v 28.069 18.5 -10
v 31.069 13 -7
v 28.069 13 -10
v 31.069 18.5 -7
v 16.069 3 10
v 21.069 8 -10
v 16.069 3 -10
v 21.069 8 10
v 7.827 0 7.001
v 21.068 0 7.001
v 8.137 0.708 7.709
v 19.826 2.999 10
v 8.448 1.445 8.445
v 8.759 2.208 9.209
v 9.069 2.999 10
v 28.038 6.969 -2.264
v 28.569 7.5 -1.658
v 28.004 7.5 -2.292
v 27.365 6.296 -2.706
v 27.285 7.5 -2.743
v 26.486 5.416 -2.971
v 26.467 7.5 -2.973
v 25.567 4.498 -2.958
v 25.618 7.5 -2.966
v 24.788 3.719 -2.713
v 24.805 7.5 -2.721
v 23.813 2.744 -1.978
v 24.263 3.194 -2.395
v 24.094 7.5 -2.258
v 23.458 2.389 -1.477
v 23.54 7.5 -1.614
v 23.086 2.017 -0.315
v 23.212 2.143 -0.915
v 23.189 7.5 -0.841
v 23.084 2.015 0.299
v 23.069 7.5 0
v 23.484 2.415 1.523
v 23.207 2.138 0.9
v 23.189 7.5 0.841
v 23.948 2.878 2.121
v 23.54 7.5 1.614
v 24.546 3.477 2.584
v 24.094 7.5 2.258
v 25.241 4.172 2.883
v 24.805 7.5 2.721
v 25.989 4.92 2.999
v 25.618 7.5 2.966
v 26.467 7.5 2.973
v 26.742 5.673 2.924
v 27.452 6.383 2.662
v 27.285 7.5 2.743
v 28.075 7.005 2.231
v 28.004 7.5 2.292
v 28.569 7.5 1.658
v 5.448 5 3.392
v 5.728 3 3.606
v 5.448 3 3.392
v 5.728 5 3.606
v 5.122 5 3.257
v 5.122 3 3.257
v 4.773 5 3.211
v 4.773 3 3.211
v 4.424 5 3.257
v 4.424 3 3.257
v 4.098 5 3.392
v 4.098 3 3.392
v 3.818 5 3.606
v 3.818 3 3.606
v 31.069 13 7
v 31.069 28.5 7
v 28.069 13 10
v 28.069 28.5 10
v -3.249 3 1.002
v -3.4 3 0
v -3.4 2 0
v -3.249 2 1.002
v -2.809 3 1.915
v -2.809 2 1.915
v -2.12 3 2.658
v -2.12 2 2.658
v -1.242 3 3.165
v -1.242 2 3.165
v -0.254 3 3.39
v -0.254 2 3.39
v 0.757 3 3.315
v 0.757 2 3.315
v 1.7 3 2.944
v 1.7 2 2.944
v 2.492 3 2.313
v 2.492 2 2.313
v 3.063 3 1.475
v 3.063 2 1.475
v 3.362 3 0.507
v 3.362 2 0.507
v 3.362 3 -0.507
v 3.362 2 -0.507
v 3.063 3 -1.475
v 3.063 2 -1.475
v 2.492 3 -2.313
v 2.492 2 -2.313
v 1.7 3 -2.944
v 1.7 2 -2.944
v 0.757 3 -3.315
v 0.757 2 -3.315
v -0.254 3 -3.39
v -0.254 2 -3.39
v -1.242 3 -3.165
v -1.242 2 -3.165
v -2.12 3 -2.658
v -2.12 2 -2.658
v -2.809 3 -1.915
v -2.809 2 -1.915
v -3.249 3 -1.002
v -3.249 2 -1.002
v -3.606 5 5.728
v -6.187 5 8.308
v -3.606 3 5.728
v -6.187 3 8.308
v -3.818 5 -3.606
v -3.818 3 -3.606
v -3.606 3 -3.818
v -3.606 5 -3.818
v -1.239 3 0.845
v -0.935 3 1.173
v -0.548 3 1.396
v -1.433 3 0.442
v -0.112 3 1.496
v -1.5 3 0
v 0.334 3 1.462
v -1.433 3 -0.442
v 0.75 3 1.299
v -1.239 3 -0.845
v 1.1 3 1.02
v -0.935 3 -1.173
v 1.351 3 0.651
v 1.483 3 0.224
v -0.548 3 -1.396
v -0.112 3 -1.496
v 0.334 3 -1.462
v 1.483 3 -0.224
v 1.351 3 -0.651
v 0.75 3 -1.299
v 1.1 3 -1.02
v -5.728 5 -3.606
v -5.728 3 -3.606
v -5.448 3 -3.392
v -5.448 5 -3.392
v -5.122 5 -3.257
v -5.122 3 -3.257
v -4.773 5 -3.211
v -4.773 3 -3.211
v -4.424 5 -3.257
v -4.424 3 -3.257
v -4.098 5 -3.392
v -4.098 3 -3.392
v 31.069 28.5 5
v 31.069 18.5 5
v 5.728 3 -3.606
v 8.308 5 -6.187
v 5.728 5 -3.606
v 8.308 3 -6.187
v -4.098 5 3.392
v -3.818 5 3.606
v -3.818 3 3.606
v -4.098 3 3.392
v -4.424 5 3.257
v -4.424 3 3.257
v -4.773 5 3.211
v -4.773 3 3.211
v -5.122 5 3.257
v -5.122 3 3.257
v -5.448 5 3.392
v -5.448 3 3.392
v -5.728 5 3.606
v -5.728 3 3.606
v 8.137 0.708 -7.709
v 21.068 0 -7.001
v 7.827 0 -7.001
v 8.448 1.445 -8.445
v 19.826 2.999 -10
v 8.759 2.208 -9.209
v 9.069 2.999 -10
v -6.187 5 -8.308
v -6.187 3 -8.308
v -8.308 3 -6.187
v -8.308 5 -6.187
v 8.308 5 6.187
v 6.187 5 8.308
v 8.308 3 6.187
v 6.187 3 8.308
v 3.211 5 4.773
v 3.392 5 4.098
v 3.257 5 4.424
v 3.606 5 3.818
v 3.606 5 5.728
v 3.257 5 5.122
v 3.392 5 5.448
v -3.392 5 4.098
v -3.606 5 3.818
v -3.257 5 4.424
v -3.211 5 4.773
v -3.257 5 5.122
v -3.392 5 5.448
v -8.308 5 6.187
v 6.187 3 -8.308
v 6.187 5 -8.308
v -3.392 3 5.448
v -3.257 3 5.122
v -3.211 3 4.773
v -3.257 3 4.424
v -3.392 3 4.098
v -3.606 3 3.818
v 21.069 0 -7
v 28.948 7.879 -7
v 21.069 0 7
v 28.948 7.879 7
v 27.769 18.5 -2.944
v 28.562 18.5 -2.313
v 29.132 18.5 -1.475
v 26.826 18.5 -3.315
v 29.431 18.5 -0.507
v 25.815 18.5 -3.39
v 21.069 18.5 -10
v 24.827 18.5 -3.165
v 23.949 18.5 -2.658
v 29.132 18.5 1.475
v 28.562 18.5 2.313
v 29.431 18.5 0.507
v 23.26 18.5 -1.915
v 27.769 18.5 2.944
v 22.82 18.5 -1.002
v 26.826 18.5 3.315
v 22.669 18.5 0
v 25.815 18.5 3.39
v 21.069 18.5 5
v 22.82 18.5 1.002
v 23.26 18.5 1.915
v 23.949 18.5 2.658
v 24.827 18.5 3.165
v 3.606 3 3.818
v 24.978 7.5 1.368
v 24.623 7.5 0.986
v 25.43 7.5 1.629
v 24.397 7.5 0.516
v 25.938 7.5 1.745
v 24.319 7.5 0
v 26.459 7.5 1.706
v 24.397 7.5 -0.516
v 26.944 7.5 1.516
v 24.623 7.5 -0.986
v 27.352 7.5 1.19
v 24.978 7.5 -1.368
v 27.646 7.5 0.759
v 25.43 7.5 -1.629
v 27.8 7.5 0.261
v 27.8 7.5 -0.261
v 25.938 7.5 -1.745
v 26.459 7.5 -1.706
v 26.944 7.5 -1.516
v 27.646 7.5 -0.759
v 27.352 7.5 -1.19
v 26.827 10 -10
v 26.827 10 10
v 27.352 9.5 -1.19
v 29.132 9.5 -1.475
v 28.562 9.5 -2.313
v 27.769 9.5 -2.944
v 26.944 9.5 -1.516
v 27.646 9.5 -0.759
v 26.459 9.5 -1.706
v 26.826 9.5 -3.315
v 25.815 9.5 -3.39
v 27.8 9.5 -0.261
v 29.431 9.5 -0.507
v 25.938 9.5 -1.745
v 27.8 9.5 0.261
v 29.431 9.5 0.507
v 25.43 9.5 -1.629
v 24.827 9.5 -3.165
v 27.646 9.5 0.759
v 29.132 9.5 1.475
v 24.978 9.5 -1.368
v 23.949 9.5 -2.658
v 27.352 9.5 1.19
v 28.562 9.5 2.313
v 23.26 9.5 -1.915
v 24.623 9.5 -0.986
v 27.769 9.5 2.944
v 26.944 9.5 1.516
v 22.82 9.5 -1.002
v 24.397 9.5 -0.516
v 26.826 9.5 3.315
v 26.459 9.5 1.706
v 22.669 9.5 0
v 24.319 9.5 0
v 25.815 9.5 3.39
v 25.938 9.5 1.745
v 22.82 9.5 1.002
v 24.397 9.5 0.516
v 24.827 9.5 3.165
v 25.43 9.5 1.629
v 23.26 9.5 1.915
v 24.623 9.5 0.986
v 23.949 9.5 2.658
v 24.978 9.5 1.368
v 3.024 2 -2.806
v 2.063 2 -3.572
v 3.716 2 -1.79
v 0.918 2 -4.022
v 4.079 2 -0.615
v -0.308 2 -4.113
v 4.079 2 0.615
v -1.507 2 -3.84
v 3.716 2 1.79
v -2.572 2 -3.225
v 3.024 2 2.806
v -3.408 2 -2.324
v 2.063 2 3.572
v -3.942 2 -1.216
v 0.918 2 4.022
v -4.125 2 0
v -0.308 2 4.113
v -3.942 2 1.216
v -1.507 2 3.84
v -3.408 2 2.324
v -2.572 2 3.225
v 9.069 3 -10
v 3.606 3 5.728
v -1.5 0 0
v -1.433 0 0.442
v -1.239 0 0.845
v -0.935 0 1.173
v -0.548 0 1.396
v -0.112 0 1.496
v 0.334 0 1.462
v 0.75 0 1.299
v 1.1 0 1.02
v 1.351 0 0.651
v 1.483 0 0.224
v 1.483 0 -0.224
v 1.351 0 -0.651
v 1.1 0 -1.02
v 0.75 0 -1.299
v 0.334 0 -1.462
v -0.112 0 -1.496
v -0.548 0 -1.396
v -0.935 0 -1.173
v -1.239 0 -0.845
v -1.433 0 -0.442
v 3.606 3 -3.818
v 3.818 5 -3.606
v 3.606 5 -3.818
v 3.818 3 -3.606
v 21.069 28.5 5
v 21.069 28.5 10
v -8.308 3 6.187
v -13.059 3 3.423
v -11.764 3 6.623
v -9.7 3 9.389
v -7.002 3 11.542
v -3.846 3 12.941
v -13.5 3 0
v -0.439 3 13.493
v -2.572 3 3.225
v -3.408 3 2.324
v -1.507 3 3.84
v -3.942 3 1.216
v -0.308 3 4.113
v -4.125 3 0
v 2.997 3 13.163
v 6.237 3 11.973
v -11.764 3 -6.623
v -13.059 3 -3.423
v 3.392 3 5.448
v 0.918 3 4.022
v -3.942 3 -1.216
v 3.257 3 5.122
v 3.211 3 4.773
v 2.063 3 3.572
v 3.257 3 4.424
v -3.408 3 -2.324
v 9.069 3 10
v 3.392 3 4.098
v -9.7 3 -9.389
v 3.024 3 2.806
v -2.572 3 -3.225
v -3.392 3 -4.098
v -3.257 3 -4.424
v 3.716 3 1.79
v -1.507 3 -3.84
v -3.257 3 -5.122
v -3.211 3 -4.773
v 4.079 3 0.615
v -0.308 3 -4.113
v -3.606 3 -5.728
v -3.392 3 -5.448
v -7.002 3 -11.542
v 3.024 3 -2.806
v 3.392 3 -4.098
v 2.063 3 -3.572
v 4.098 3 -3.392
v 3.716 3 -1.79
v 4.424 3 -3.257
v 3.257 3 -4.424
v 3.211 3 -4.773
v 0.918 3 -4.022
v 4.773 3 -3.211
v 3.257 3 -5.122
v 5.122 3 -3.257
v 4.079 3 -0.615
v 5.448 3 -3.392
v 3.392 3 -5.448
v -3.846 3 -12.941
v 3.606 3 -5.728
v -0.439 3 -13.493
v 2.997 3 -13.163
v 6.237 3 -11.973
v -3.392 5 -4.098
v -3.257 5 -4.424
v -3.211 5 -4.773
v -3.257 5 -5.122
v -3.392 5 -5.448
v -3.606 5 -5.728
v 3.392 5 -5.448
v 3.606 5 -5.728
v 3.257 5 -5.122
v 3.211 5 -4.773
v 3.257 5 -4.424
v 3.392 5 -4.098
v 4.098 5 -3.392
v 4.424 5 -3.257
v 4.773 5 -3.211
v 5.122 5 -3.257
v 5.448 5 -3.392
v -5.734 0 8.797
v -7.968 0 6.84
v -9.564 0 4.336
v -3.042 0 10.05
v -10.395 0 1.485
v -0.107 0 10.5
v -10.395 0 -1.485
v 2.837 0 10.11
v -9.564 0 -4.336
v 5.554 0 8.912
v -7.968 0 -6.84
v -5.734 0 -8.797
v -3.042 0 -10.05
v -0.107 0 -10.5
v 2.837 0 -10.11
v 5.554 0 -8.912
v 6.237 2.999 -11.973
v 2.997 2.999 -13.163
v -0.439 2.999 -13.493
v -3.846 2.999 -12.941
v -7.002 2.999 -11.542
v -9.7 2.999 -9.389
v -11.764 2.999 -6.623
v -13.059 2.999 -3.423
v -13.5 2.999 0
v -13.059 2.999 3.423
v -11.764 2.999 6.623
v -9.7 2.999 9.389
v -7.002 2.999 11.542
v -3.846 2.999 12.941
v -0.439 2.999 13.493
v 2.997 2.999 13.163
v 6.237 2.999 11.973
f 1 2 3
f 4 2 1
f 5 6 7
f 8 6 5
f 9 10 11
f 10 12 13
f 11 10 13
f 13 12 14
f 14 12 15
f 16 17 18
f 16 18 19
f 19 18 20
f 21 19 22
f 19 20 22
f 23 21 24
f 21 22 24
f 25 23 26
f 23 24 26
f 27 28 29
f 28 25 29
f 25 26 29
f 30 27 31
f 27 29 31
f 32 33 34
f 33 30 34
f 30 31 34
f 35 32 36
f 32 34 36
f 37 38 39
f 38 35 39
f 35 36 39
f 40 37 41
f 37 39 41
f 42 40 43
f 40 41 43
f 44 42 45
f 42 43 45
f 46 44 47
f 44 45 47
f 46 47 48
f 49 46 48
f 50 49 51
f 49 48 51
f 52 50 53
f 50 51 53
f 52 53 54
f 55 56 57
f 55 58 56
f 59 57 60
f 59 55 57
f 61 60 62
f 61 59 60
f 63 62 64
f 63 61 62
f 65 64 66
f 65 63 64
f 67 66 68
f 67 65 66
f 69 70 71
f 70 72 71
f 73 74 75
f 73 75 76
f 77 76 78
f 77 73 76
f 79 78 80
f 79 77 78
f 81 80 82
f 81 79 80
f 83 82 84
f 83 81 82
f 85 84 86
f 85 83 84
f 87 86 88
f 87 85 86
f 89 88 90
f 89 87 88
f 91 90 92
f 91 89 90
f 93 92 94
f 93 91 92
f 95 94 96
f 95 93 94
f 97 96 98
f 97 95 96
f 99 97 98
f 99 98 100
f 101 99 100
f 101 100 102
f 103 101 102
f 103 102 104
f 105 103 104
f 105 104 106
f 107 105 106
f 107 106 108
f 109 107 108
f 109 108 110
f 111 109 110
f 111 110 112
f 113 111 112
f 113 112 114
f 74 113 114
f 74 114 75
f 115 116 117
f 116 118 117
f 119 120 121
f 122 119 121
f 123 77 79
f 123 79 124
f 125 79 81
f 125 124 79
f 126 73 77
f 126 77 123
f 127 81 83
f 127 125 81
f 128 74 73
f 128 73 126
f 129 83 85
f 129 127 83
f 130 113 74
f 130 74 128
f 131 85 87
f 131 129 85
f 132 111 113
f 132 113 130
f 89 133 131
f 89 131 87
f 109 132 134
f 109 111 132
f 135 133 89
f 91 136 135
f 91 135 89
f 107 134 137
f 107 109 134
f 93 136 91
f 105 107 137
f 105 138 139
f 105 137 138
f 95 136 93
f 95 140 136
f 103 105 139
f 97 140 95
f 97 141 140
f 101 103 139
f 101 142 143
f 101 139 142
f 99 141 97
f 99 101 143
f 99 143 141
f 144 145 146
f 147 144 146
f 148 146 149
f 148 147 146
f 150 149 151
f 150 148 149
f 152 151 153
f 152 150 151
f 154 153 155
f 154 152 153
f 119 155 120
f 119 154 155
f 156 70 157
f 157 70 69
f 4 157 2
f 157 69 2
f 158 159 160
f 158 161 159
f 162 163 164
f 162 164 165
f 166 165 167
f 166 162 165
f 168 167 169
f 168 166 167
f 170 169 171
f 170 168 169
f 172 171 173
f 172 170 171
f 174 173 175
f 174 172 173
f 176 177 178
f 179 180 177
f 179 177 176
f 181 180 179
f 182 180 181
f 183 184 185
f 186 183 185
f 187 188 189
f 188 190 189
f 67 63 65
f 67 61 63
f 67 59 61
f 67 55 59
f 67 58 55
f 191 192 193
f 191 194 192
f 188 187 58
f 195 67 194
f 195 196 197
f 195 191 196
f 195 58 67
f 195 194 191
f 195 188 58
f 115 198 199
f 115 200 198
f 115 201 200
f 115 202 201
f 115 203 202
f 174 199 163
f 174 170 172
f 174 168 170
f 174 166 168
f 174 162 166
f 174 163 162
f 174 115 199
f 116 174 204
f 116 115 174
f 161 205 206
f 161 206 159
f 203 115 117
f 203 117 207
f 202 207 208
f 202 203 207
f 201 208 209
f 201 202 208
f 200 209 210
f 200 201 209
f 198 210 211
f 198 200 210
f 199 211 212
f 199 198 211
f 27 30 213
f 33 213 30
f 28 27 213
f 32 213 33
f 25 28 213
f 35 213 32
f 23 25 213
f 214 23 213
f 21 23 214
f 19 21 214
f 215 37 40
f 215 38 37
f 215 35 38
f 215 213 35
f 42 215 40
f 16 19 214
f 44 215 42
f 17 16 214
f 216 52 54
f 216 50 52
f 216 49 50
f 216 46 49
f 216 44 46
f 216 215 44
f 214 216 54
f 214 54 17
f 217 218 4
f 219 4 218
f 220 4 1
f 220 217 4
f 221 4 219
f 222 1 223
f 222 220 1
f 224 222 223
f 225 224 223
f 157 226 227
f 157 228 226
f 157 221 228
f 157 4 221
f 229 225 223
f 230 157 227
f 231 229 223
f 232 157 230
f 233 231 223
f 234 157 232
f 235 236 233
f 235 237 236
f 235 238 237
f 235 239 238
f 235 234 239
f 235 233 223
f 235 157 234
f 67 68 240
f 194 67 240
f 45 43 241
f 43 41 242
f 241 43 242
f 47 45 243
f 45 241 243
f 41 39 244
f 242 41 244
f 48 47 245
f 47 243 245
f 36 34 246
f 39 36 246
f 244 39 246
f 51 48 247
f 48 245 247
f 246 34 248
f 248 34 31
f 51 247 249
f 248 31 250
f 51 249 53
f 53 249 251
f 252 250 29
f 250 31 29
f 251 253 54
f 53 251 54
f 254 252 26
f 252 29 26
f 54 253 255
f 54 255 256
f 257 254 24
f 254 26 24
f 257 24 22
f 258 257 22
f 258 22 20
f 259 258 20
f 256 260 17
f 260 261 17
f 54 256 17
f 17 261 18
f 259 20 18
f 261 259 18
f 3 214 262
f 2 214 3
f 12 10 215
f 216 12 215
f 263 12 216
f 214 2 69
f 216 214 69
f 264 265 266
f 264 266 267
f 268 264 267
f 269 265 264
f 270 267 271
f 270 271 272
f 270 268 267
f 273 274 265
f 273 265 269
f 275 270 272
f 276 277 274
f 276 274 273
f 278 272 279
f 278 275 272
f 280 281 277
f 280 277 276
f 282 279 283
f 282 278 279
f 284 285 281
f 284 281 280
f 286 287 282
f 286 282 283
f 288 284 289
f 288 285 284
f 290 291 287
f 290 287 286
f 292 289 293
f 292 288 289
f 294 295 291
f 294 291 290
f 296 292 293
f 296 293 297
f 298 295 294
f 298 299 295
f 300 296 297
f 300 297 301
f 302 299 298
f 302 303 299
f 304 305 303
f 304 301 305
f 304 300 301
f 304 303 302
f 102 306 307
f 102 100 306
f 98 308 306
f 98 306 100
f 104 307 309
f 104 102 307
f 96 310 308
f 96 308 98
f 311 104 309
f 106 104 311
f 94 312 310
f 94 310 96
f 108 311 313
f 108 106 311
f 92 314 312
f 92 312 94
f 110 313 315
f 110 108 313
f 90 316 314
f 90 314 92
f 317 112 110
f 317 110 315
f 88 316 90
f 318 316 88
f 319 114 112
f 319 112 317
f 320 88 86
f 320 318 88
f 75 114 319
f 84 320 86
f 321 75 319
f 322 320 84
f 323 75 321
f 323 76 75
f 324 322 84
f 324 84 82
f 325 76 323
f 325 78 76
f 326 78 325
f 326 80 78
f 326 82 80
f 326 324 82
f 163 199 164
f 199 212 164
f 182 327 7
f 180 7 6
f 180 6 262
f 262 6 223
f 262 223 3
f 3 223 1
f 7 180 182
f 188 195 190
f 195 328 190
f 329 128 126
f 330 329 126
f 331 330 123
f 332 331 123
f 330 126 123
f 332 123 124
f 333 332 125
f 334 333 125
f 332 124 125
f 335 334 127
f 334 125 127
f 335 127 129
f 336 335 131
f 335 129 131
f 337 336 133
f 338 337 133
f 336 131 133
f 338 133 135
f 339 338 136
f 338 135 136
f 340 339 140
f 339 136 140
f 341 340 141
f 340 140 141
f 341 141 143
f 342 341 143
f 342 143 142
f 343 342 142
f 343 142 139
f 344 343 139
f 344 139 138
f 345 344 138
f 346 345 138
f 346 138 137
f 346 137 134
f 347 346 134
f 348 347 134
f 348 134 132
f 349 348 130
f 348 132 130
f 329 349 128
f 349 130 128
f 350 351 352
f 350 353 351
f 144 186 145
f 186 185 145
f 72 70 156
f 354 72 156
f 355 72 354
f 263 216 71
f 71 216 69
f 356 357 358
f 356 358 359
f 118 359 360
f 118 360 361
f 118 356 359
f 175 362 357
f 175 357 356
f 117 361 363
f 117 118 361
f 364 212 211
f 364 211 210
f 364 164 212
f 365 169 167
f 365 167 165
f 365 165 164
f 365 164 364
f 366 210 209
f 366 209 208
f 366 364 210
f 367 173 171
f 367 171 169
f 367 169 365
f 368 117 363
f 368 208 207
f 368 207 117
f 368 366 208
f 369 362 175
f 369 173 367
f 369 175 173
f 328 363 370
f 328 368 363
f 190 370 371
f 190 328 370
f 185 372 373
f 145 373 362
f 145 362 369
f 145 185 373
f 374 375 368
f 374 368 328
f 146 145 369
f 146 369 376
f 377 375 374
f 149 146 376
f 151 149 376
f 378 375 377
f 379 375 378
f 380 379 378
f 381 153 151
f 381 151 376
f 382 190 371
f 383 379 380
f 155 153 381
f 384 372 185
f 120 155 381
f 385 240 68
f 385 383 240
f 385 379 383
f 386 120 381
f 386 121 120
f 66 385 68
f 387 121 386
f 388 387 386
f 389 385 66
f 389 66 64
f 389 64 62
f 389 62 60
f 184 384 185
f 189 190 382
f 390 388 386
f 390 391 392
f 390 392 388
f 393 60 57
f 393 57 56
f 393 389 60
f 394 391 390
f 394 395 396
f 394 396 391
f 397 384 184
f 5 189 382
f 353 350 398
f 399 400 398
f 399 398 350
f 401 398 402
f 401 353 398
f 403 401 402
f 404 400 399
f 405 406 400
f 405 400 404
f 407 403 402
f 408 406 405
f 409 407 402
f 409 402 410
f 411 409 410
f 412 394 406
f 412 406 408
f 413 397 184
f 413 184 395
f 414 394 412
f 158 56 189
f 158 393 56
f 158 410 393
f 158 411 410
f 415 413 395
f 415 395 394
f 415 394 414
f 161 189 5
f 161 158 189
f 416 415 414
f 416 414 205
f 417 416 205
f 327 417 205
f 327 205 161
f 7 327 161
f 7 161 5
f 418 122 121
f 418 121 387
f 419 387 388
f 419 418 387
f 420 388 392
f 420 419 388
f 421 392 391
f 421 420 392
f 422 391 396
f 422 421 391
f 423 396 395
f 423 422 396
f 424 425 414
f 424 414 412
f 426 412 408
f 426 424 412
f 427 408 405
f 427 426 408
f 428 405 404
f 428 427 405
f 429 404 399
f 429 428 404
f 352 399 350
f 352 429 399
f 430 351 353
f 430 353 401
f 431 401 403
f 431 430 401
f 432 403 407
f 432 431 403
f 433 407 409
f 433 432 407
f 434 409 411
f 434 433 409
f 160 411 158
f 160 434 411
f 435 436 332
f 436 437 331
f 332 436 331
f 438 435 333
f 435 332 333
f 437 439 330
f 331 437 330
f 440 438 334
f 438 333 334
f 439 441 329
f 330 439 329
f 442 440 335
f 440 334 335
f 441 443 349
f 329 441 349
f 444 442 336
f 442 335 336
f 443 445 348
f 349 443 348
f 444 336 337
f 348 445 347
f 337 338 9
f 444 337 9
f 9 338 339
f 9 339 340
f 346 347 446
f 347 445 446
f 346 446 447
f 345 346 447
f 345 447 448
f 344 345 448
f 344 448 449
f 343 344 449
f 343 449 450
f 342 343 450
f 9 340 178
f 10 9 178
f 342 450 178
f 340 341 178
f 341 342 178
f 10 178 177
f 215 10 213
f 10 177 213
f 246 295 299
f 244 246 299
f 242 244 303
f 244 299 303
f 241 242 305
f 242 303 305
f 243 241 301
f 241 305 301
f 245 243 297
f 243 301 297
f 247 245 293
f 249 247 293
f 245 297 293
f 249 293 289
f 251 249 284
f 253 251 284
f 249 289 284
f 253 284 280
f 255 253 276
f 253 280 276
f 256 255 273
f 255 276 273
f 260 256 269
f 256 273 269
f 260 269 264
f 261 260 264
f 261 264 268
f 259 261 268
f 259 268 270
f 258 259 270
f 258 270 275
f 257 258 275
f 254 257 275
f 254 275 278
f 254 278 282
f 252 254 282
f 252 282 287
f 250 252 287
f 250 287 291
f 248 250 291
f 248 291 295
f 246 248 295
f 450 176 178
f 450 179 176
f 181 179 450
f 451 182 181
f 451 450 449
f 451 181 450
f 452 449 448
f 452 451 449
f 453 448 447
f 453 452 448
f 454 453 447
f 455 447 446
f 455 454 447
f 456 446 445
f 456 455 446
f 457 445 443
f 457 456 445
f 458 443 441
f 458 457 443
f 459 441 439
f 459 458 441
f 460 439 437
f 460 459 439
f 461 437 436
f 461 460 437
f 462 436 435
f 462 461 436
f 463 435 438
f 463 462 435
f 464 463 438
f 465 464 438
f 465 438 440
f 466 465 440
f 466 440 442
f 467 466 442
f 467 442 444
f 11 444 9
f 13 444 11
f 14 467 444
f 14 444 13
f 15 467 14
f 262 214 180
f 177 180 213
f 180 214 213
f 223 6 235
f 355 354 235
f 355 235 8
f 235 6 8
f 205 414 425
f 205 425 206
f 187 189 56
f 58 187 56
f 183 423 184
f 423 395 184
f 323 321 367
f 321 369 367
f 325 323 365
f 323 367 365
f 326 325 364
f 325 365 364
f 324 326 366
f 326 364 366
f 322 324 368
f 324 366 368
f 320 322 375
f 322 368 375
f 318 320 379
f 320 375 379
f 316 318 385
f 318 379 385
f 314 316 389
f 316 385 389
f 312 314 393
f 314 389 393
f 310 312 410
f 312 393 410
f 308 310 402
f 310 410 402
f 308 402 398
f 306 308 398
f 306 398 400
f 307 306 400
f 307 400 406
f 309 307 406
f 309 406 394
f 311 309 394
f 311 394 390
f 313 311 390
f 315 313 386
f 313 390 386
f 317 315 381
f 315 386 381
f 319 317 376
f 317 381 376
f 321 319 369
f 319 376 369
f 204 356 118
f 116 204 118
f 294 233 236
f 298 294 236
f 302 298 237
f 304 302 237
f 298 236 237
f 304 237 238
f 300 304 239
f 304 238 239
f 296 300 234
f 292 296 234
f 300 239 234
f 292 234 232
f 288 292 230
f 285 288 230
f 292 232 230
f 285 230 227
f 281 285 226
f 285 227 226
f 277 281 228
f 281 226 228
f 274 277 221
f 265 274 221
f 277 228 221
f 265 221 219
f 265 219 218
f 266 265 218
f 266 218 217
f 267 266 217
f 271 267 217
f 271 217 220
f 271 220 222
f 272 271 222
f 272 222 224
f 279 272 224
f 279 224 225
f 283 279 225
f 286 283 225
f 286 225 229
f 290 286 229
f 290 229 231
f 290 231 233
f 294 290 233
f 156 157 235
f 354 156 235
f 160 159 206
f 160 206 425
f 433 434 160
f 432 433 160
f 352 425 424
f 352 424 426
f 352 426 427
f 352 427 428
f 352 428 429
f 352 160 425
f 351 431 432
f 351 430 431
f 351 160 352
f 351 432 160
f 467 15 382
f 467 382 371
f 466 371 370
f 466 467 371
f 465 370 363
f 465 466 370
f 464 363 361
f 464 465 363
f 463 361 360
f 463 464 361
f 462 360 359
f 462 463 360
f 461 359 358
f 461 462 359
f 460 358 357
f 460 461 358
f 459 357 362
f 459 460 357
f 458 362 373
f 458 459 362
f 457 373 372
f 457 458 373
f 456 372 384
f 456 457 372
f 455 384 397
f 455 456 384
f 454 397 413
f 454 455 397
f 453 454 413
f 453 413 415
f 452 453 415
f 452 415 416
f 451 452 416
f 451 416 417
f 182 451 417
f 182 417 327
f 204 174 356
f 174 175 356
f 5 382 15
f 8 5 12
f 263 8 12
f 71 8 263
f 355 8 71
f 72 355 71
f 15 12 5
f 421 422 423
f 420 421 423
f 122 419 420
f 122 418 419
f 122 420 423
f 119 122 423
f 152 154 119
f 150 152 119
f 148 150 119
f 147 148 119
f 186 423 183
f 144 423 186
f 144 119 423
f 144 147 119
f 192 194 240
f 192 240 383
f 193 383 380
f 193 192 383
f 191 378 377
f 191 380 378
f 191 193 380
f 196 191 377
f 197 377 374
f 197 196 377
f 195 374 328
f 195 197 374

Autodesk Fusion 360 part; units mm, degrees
sketch "Sketch1" plane through (0, 0, 0) normal (0, 1, 0) x (1, 0, 0)
  circle A0 centre (0, 0) radius 13.5
  line L0 (9.0692, -10) -> (9.0692, 10)
  line L1 (9.0692, 10) -> (21.0692, 10)
  line L2 (21.0692, 10) -> (21.0692, -10)
  line L3 (21.0692, -10) -> (9.0692, -10)
  line L4 (9.0692, -10) -> (9.0692, 10)
  dimension "d1" = 27
  dimension "d4" = 20
  dimension "d5" = 12
  dimension "d6" = 20
extrude "Extrude1" add sketch "Sketch1" along normal blind 3
sketch "Sketch2" plane through (0, 3, 0) normal (0, 1, 0) x (-1, 0, 0)
  arc A0 (-9.0692, -10) -> (-9.0692, 10) centre (0, 0) ccw
  line L0 (-9.0692, 10) -> (-21.0692, 10)
  line L1 (-21.0692, 10) -> (-21.0692, -10)
  line L2 (-21.0692, -10) -> (-9.0692, -10)
  circle A1 centre (0, 0) radius 1.5
  dimension "d11" = 3
extrude "Extrude2" cut sketch "Sketch2" against normal blind 7 contours A1
sketch "Sketch3" plane through (0, 3, 0) normal (0, 1, 0) x (-1, 0, 0)
  circle A0 centre (0, 0) radius 1.5
  arc A1 (-9.0692, -10) -> (-9.0692, 10) centre (0, 0) ccw
  line L0 (-9.0692, 10) -> (-21.0692, 10)
  line L1 (-21.0692, 10) -> (-21.0692, -10)
  line L2 (-21.0692, -10) -> (-9.0692, -10)
  line L3 (0, 0) -> (7.2478, -7.2478) construction
  line L4 (0, 0) -> (-7.2478, 7.2478) construction
  line L5 (0, 0) -> (7.2478, 7.2478) construction
  line L6 (0, 0) -> (10.5, 0) construction
  line L7 (0, 0) -> (-7.2478, -7.2478) construction
  line L8 (-7.2478, 7.2478) -> (-6.1872, 8.3085) construction
  line L9 (7.2478, 7.2478) -> (8.3085, 6.1872) construction
  line L10 (7.2478, -7.2478) -> (6.1872, -8.3085) construction
  line L11 (-7.2478, -7.2478) -> (-8.3085, -6.1872) construction
  line L12 (-8.3085, -6.1872) -> (-4.773, -2.6517)
  line L13 (-4.773, -2.6517) -> (-2.6517, -4.773)
  line L14 (-4.773, -2.6517) -> (-1.773, -2.6517) construction
  line L15 (-2.6517, -4.773) -> (-6.1872, -8.3085)
  line L16 (-6.1872, -8.3085) -> (-8.3085, -6.1872)
  line L17 (-6.1872, 8.3085) -> (-8.3085, 6.1872)
  line L18 (-8.3085, 6.1872) -> (-4.773, 2.6517)
  line L19 (-4.773, 2.6517) -> (-2.6517, 4.773)
  line L20 (-4.773, 2.6517) -> (-1.773, 2.6517) construction
  line L21 (-2.6517, 4.773) -> (-6.1872, 8.3085)
  line L22 (8.3085, 6.1872) -> (6.1872, 8.3085)
  line L23 (6.1872, 8.3085) -> (2.6517, 4.773)
  line L24 (6.1872, 8.3085) -> (11.1872, 8.3085) construction
  line L25 (2.6517, 4.773) -> (4.773, 2.6517)
  line L26 (4.773, 2.6517) -> (8.3085, 6.1872)
  line L27 (6.1872, -8.3085) -> (8.3085, -6.1872)
  line L28 (8.3085, -6.1872) -> (4.773, -2.6517)
  line L29 (4.773, -2.6517) -> (2.6517, -4.773)
  line L30 (2.6517, -4.773) -> (6.1872, -8.3085)
  dimension "d15" = 10.25
  dimension "d16" = 10.25
  dimension "d18" = 45
  dimension "d19" = 10.25
  dimension "d20" = 10.25
  dimension "d79" = 1.5
  dimension "d80" = 1.5
  dimension "d81" = 1.5
  dimension "d84" = 1.5
  dimension "d85" = 5
  dimension "d86" = 45
  dimension "d87" = 3
  dimension "d88" = 5
  dimension "d89" = 3
  dimension "d90" = 5
  dimension "d91" = 45
  dimension "d92" = 3
  dimension "d93" = 3
  dimension "d94" = 135
  dimension "d95" = 5
  dimension "d96" = 3
  dimension "d97" = 3
  dimension "d98" = 5
  dimension "d99" = 3
extrude "Extrude12" add sketch "Sketch3" along normal blind 2 contours L12 L13 L15 L16 | L17 L18 L19 L21 | L22 L23 L25 L26 | L27 L28 L29 L30
sketch "Sketch4" plane through (0, 3, 0) normal (0, 1, 0) x (-1, 0, 0)
  circle A0 centre (0, 0) radius 1.5
  arc A1 (-9.0692, -10) -> (-9.0692, 10) centre (0, 0) ccw
  line L0 (-9.0692, 10) -> (-21.0692, 10)
  line L1 (-21.0692, 10) -> (-21.0692, -10)
  line L2 (-21.0692, -10) -> (-9.0692, -10)
  circle A2 centre (0, 0) radius 3.4
  circle A3 centre (0, 0) radius 4.125
  line L3 (-2.6517, 4.773) -> (-4.773, 2.6517)
  line L4 (-4.773, 2.6517) -> (-8.3085, 6.1872)
  line L5 (-8.3085, 6.1872) -> (-6.1872, 8.3085)
  line L6 (-6.1872, 8.3085) -> (-2.6517, 4.773)
  line L7 (4.773, 2.6517) -> (2.6517, 4.773)
  line L8 (2.6517, 4.773) -> (6.1872, 8.3085)
  line L9 (6.1872, 8.3085) -> (8.3085, 6.1872)
  line L10 (8.3085, 6.1872) -> (4.773, 2.6517)
  line L11 (-6.1872, -8.3085) -> (-8.3085, -6.1872)
  line L12 (-8.3085, -6.1872) -> (-4.773, -2.6517)
  line L13 (-4.773, -2.6517) -> (-2.6517, -4.773)
  line L14 (-2.6517, -4.773) -> (-6.1872, -8.3085)
  line L15 (2.6517, -4.773) -> (4.773, -2.6517)
  line L16 (4.773, -2.6517) -> (8.3085, -6.1872)
  line L17 (8.3085, -6.1872) -> (6.1872, -8.3085)
  line L18 (6.1872, -8.3085) -> (2.6517, -4.773)
  dimension "d42" = 6.8
  dimension "d43" = 8.25
extrude "Extrude4" cut sketch "Sketch4" against normal blind 1 contours A3
sketch "Sketch5" plane through (0, 3, 0) normal (0, 1, 0) x (-1, 0, 0)
  arc A0 (-9.0692, -10) -> (-9.0692, 10) centre (0, 0) ccw
  line L0 (-9.0692, 10) -> (-21.0692, 10)
  line L1 (-21.0692, 10) -> (-21.0692, -10)
  line L2 (-21.0692, -10) -> (-9.0692, -10)
  circle A1 centre (0, 0) radius 4.125
  line L3 (-21.0692, -10) -> (-31.0692, -10)
  line L4 (-31.0692, -10) -> (-31.0692, 10)
  line L5 (-31.0692, 10) -> (-21.0692, 10)
  line L6 (-21.0692, 10) -> (-21.0692, -10)
  line L7 (2.6517, -4.773) -> (4.773, -2.6517)
  line L8 (4.773, -2.6517) -> (8.3085, -6.1872)
  line L9 (8.3085, -6.1872) -> (6.1872, -8.3085)
  line L10 (6.1872, -8.3085) -> (2.6517, -4.773)
  line L11 (-6.1872, -8.3085) -> (-8.3085, -6.1872)
  line L12 (-8.3085, -6.1872) -> (-4.773, -2.6517)
  line L13 (-4.773, -2.6517) -> (-2.6517, -4.773)
  line L14 (-2.6517, -4.773) -> (-6.1872, -8.3085)
  line L15 (4.773, 2.6517) -> (2.6517, 4.773)
  line L16 (2.6517, 4.773) -> (6.1872, 8.3085)
  line L17 (6.1872, 8.3085) -> (8.3085, 6.1872)
  line L18 (8.3085, 6.1872) -> (4.773, 2.6517)
  line L19 (-2.6517, 4.773) -> (-4.773, 2.6517)
  line L20 (-4.773, 2.6517) -> (-8.3085, 6.1872)
  line L21 (-8.3085, 6.1872) -> (-6.1872, 8.3085)
  line L22 (-6.1872, 8.3085) -> (-2.6517, 4.773)
  dimension "d46" = 10
  dimension "d47" = 20
extrude "Extrude5" add sketch "Sketch5" along normal blind 16.5 contours L1 L3 L4 L5 L6
sketch "Sketch6" plane through (0, 19.5, 0) normal (0, 1, 0) x (-1, 0, 0)
  line L0 (-21.0692, 10) -> (-31.0692, 10)
  line L1 (-31.0692, 10) -> (-31.0692, -10)
  line L2 (-31.0692, -10) -> (-21.0692, -10)
  line L3 (-21.0692, -10) -> (-21.0692, 10)
  line L4 (-21.0692, 10) -> (-31.0692, 10)
  line L5 (-31.0692, 10) -> (-31.0692, 5)
  line L6 (-31.0692, 5) -> (-21.0692, 5)
  line L7 (-21.0692, 5) -> (-21.0692, 10)
  dimension "d50" = 10
  dimension "d51" = 5
extrude "Extrude6" add sketch "Sketch6" along normal blind 10 contours L0 L1 L3 L4 L5 L6 L7
sketch "Sketch7" plane through (0, 19.5, 0) normal (0, 1, 0) x (-1, 0, 0)
  line L0 (-21.0692, 5) -> (-31.0692, 5)
  line L1 (-31.0692, 5) -> (-31.0692, -10)
  line L2 (-31.0692, -10) -> (-21.0692, -10)
  line L3 (-21.0692, -10) -> (-21.0692, 5)
  line L4 (-21.0692, -10) -> (-21.0692, 10)
  line L5 (-21.0692, 0) -> (-26.0692, 0)
  circle A0 centre (-26.0692, 0) radius 3.4
  dimension "d54" = 5
  dimension "d55" = 6.8
extrude "Extrude7" cut sketch "Sketch7" against normal blind 9 contours A0
sketch "Sketch8" plane through (0, 10.5, 0) normal (0, 1, 0) x (-1, 0, 0)
  circle A0 centre (-26.0692, 0) radius 3.4
  circle A1 centre (-26.0692, 0) radius 1.75
  dimension "d60" = 3.5
sketch "Sketch9" plane through (0, 0, 10) normal (0, 0, 1) x (1, 0, 0)
  line L0 (9.0692, 0) -> (21.0692, 0)
  line L1 (21.0692, 0) -> (21.0692, 3)
  line L2 (21.0692, 3) -> (9.0692, 3)
  line L3 (9.0692, 3) -> (9.0692, 0)
  line L4 (21.0692, 0) -> (27.5513, 6.4821)
  line L5 (21.0692, 0) -> (30.2363, 0) construction
  line L6 (21.0692, 0) -> (21.0692, 3)
  line L7 (31.0692, 3) -> (21.0692, 3)
  line L8 (21.0692, 3) -> (26.0692, 3)
  dimension "d61" = 45
extrude "Extrude8" add sketch "Sketch9" against normal blind 20 contours L1 L4 L6 L7 L8
sketch "Sketch10" plane through (0, 0, 10) normal (0, 0, 1) x (1, 0, 0)
  line L0 (24.0692, 3) -> (31.0692, 3)
  line L1 (31.0692, 3) -> (31.0692, 29.5)
  line L2 (31.0692, 29.5) -> (21.0692, 29.5)
  line L3 (21.0692, 29.5) -> (21.0692, 3)
  line L4 (21.0692, 3) -> (9.0692, 3)
  line L5 (9.0692, 3) -> (9.0692, 0)
  line L6 (9.0692, 0) -> (21.0692, 0)
  line L7 (21.0692, 0) -> (24.0692, 3)
  line L8 (24.0692, 3) -> (32.4914, 11.4222)
  line L9 (24.0692, 3) -> (35.98, 3) construction
  dimension "d64" = 45
extrude "Extrude9" cut sketch "Sketch10" against normal blind 77 contours L0 L1 L8
extrude "Extrude10" cut sketch "Sketch8" against normal blind 20 contours A1
ref_plane "WorkPlane1" through (26.0692, 7.5, 0) normal (0, 1, 0) x (-1, 0, 0)
sketch "Sketch11" plane through (26.0692, 7.5, 0) normal (0, 1, 0) x (1, 0, 0)
  circle A0 centre (0, 0) radius 3
  dimension "d70" = 6
extrude "Extrude11" cut sketch "Sketch11" against normal blind 10
chamfer "Chamfer1" distance 3 angle 45 3 edges at (15.0692, 0, 10) (-13.5, 0, 0) (15.0692, 0, -10)
chamfer "Chamfer2" distance 5 angle 45 1 edges at (21.0692, 3, 0)
chamfer "Chamfer3" distance 3 angle 45 5 edges at (27.5692, 6.5, 10) (31.0692, 19.75, 10) (27.5692, 6.5, -10) (31.0692, 14.75, -10) (31.0692, 10, 0)
fillet "Fillet2" radius 1.35 8 edges at (-2.6517, 4, 4.773) (-4.773, 4, 2.6517) (-4.773, 4, -2.6517) (-2.6517, 4, -4.773) (2.6517, 4, -4.773) (4.773, 4, -2.6517) (4.773, 4, 2.6517) (2.6517, 4, 4.773)
extrude "Extrude13" cut 1 faces at (26.7358, 29.5, 6.6667) along direction (0, -1, 0) blind 1
extrude "Extrude14" cut 1 faces at (24.817, 19.5, -7.7716) along direction (0, -1, 0) blind 1
extrude "Extrude15" cut 1 faces at (23.2318, 10.5, -0.1689) along direction (0, -1, 0) blind 1
equation "d5 = KneeSeparation"
equation "d7 = BottomThickness"
equation "BottomThickness = 3 mm"
equation "KneeSeparation = 12 mm"
equation "d11 = ServoScrewHole"
equation "ScrewHole = 3.0 mm"
equation "HornFit = 1.35 mm"
equation "d54 = HolePosX"
equation "d55 = HoleSize"
equation "HolePosX = 5 mm"
equation "HoleSize = 6.8 mm"
equation "d58 = -HoleDepth"
equation "d60 = SpacerScrewHole"
equation "d70 = HoleFit"
equation "HoleFit = 6 mm"
equation "ChamferStrength = 5 mm"
equation "Chamfer3 = 3 mm"
equation "d76 = Chamfer3"
equation "d77 = ChamferStrength"
equation "d78 = Chamfer3"
equation "FilletFIT = 1.35 mm"
equation "d103 = FilletFIT"
equation "HoleDepth = 9 mm"
equation "ServoScrewHole = 3 mm"
equation "SpacerScrewHole = 3.5 mm"
